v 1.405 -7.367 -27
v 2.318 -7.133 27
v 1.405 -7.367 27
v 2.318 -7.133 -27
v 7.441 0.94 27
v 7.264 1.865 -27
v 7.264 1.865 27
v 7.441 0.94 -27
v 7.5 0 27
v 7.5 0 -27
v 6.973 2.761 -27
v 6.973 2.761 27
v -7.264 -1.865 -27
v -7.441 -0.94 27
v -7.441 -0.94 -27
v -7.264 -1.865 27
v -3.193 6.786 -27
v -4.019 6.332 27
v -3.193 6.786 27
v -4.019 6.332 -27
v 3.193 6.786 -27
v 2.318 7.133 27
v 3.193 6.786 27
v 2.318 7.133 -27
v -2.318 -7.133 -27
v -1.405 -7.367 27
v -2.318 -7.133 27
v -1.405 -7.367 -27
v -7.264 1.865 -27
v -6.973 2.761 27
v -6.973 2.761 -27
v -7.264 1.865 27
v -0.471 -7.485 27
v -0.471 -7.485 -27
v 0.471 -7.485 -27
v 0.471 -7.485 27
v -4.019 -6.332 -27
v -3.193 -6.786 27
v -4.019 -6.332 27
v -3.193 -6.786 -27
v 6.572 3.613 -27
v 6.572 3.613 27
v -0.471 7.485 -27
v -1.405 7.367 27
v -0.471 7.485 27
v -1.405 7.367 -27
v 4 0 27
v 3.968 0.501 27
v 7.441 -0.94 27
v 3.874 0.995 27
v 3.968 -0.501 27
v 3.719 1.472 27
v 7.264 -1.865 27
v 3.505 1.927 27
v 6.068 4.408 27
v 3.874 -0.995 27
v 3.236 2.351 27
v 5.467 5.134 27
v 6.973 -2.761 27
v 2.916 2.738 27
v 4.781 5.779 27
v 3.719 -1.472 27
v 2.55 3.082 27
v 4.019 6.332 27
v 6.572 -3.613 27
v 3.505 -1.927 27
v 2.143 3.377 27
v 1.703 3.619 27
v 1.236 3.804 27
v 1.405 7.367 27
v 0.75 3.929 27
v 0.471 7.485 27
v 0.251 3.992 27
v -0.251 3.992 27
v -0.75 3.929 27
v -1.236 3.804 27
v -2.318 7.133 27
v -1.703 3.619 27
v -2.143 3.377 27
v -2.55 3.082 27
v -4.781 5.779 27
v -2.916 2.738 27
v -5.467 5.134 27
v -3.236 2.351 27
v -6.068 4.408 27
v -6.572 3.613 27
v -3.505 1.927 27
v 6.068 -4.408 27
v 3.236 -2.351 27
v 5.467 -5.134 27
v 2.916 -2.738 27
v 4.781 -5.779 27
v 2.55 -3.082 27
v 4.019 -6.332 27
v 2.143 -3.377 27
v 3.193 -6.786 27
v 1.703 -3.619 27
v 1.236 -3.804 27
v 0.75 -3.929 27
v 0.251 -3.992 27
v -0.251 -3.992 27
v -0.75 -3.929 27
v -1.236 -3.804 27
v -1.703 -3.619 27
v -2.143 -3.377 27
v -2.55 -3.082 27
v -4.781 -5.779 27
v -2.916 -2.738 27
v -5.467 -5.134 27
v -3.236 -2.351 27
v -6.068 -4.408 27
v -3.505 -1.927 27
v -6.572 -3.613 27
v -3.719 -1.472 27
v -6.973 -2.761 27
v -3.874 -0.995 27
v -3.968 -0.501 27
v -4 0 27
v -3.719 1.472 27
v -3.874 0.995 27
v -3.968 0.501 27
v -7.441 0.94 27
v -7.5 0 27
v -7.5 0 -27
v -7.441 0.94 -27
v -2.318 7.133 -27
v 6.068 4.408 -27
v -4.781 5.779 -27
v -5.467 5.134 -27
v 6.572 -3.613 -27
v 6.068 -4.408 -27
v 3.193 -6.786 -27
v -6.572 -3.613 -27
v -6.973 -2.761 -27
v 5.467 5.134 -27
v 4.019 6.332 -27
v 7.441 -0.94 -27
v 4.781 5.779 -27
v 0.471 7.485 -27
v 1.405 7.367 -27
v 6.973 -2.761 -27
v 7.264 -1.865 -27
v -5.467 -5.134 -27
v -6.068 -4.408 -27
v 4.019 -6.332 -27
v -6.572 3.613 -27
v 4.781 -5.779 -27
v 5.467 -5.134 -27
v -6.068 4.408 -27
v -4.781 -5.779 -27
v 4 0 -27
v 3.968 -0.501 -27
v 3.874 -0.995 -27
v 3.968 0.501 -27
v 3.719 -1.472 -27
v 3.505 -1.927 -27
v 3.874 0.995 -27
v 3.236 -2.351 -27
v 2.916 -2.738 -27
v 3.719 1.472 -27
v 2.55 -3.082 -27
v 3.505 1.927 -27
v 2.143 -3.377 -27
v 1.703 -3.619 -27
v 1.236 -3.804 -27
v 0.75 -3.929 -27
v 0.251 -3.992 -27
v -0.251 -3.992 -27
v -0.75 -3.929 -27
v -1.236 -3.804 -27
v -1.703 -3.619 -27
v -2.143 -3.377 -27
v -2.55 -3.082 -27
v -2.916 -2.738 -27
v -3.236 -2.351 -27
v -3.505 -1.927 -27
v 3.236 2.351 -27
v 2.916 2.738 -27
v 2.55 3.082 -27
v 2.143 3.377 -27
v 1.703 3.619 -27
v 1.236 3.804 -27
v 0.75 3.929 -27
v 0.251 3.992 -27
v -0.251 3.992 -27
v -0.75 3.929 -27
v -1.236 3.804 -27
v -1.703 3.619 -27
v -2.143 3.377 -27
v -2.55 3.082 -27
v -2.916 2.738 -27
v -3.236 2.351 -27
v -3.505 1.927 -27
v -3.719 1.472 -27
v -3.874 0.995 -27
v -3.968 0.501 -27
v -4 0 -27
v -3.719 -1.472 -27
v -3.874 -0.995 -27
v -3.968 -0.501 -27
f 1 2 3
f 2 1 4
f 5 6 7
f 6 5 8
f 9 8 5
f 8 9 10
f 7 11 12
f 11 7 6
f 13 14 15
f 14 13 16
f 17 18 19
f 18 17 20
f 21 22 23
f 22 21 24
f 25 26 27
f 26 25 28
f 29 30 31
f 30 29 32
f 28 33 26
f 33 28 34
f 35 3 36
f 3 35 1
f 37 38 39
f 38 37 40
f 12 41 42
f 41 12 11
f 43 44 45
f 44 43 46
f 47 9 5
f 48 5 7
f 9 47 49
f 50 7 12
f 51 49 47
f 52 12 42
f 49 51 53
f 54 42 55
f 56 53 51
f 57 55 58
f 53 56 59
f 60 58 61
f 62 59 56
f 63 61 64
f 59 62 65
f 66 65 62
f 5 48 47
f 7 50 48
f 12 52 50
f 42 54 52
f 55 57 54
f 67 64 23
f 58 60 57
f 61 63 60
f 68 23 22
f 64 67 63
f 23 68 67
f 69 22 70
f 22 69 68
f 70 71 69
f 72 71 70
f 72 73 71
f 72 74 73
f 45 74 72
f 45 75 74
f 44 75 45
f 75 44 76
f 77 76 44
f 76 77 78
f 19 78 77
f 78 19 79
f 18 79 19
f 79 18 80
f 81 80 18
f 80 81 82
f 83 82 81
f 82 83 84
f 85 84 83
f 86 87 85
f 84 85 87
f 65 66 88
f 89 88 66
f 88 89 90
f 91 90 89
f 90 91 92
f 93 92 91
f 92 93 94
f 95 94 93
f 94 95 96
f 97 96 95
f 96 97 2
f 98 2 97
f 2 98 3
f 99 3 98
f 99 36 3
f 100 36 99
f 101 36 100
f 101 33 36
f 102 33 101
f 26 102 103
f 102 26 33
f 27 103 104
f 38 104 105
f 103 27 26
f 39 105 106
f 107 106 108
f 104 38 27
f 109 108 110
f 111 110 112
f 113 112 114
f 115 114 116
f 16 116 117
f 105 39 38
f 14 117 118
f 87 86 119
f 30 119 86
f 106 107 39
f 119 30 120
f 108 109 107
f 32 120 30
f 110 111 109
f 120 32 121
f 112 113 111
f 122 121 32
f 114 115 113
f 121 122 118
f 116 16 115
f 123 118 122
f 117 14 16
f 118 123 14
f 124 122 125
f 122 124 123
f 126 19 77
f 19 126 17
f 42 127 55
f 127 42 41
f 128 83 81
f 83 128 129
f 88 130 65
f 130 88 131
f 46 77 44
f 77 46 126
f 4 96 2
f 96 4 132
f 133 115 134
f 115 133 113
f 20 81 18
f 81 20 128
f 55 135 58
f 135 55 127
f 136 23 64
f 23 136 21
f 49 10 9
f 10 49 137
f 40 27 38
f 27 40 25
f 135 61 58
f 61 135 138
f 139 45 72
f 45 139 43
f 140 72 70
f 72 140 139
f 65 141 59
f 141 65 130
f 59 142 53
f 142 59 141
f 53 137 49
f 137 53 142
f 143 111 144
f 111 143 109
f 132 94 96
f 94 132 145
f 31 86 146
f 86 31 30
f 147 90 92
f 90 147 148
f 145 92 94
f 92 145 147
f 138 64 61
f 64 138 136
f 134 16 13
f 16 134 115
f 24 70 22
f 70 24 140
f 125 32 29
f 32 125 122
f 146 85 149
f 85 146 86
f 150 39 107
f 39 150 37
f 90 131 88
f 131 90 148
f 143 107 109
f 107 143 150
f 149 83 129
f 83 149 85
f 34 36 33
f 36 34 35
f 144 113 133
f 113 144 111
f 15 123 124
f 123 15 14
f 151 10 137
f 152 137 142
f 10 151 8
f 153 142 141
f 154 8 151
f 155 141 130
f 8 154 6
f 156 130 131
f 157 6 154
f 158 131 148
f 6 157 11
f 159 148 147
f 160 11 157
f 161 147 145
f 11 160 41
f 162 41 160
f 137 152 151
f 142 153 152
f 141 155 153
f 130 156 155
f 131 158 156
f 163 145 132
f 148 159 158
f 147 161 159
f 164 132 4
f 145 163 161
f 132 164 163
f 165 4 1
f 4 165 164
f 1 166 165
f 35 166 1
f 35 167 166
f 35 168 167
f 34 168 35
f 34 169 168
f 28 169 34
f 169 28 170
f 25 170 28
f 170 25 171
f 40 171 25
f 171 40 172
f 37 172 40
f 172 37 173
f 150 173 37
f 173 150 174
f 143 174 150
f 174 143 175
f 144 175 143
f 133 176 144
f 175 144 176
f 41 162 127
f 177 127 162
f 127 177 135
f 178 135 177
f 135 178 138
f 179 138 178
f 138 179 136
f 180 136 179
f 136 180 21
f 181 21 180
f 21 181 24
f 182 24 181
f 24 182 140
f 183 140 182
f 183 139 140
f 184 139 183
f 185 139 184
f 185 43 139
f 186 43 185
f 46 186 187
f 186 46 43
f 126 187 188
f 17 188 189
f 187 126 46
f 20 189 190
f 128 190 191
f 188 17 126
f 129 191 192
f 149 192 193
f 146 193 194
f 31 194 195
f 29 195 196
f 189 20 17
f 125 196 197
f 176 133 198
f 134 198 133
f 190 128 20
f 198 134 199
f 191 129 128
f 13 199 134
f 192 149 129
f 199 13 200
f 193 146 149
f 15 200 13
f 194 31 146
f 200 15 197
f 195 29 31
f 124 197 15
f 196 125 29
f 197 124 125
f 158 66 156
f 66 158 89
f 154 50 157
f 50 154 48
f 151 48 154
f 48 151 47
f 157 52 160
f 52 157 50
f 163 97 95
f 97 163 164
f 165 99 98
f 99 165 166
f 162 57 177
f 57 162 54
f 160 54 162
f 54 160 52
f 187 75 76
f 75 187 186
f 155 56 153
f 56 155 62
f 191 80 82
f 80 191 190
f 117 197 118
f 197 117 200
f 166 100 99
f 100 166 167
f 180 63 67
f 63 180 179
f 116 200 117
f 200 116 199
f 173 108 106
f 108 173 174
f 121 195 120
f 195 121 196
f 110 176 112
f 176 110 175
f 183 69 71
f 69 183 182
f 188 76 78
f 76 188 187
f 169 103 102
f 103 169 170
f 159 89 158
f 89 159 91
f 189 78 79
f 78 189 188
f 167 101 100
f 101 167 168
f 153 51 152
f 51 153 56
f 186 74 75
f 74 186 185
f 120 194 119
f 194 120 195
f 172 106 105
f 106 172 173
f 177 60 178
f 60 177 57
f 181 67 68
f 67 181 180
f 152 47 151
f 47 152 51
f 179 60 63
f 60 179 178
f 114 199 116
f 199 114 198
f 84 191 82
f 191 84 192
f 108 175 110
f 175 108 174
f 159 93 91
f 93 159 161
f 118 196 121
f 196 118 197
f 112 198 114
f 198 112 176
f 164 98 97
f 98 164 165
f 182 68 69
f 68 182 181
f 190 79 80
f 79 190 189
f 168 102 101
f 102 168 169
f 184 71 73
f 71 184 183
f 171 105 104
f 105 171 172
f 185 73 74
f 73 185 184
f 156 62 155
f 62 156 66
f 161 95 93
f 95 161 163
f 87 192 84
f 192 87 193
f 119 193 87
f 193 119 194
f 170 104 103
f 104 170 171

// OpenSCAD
$fn = 50;


difference() {
	union() {
		translate(v = [0, 0, -27.0000000000]) {
			cylinder(h = 54, r = 7.5000000000);
		}
	}
	union() {
		translate(v = [0, 0, -100.0000000000]) {
			cylinder(h = 200, r = 4.0000000000);
		}
	}
}
